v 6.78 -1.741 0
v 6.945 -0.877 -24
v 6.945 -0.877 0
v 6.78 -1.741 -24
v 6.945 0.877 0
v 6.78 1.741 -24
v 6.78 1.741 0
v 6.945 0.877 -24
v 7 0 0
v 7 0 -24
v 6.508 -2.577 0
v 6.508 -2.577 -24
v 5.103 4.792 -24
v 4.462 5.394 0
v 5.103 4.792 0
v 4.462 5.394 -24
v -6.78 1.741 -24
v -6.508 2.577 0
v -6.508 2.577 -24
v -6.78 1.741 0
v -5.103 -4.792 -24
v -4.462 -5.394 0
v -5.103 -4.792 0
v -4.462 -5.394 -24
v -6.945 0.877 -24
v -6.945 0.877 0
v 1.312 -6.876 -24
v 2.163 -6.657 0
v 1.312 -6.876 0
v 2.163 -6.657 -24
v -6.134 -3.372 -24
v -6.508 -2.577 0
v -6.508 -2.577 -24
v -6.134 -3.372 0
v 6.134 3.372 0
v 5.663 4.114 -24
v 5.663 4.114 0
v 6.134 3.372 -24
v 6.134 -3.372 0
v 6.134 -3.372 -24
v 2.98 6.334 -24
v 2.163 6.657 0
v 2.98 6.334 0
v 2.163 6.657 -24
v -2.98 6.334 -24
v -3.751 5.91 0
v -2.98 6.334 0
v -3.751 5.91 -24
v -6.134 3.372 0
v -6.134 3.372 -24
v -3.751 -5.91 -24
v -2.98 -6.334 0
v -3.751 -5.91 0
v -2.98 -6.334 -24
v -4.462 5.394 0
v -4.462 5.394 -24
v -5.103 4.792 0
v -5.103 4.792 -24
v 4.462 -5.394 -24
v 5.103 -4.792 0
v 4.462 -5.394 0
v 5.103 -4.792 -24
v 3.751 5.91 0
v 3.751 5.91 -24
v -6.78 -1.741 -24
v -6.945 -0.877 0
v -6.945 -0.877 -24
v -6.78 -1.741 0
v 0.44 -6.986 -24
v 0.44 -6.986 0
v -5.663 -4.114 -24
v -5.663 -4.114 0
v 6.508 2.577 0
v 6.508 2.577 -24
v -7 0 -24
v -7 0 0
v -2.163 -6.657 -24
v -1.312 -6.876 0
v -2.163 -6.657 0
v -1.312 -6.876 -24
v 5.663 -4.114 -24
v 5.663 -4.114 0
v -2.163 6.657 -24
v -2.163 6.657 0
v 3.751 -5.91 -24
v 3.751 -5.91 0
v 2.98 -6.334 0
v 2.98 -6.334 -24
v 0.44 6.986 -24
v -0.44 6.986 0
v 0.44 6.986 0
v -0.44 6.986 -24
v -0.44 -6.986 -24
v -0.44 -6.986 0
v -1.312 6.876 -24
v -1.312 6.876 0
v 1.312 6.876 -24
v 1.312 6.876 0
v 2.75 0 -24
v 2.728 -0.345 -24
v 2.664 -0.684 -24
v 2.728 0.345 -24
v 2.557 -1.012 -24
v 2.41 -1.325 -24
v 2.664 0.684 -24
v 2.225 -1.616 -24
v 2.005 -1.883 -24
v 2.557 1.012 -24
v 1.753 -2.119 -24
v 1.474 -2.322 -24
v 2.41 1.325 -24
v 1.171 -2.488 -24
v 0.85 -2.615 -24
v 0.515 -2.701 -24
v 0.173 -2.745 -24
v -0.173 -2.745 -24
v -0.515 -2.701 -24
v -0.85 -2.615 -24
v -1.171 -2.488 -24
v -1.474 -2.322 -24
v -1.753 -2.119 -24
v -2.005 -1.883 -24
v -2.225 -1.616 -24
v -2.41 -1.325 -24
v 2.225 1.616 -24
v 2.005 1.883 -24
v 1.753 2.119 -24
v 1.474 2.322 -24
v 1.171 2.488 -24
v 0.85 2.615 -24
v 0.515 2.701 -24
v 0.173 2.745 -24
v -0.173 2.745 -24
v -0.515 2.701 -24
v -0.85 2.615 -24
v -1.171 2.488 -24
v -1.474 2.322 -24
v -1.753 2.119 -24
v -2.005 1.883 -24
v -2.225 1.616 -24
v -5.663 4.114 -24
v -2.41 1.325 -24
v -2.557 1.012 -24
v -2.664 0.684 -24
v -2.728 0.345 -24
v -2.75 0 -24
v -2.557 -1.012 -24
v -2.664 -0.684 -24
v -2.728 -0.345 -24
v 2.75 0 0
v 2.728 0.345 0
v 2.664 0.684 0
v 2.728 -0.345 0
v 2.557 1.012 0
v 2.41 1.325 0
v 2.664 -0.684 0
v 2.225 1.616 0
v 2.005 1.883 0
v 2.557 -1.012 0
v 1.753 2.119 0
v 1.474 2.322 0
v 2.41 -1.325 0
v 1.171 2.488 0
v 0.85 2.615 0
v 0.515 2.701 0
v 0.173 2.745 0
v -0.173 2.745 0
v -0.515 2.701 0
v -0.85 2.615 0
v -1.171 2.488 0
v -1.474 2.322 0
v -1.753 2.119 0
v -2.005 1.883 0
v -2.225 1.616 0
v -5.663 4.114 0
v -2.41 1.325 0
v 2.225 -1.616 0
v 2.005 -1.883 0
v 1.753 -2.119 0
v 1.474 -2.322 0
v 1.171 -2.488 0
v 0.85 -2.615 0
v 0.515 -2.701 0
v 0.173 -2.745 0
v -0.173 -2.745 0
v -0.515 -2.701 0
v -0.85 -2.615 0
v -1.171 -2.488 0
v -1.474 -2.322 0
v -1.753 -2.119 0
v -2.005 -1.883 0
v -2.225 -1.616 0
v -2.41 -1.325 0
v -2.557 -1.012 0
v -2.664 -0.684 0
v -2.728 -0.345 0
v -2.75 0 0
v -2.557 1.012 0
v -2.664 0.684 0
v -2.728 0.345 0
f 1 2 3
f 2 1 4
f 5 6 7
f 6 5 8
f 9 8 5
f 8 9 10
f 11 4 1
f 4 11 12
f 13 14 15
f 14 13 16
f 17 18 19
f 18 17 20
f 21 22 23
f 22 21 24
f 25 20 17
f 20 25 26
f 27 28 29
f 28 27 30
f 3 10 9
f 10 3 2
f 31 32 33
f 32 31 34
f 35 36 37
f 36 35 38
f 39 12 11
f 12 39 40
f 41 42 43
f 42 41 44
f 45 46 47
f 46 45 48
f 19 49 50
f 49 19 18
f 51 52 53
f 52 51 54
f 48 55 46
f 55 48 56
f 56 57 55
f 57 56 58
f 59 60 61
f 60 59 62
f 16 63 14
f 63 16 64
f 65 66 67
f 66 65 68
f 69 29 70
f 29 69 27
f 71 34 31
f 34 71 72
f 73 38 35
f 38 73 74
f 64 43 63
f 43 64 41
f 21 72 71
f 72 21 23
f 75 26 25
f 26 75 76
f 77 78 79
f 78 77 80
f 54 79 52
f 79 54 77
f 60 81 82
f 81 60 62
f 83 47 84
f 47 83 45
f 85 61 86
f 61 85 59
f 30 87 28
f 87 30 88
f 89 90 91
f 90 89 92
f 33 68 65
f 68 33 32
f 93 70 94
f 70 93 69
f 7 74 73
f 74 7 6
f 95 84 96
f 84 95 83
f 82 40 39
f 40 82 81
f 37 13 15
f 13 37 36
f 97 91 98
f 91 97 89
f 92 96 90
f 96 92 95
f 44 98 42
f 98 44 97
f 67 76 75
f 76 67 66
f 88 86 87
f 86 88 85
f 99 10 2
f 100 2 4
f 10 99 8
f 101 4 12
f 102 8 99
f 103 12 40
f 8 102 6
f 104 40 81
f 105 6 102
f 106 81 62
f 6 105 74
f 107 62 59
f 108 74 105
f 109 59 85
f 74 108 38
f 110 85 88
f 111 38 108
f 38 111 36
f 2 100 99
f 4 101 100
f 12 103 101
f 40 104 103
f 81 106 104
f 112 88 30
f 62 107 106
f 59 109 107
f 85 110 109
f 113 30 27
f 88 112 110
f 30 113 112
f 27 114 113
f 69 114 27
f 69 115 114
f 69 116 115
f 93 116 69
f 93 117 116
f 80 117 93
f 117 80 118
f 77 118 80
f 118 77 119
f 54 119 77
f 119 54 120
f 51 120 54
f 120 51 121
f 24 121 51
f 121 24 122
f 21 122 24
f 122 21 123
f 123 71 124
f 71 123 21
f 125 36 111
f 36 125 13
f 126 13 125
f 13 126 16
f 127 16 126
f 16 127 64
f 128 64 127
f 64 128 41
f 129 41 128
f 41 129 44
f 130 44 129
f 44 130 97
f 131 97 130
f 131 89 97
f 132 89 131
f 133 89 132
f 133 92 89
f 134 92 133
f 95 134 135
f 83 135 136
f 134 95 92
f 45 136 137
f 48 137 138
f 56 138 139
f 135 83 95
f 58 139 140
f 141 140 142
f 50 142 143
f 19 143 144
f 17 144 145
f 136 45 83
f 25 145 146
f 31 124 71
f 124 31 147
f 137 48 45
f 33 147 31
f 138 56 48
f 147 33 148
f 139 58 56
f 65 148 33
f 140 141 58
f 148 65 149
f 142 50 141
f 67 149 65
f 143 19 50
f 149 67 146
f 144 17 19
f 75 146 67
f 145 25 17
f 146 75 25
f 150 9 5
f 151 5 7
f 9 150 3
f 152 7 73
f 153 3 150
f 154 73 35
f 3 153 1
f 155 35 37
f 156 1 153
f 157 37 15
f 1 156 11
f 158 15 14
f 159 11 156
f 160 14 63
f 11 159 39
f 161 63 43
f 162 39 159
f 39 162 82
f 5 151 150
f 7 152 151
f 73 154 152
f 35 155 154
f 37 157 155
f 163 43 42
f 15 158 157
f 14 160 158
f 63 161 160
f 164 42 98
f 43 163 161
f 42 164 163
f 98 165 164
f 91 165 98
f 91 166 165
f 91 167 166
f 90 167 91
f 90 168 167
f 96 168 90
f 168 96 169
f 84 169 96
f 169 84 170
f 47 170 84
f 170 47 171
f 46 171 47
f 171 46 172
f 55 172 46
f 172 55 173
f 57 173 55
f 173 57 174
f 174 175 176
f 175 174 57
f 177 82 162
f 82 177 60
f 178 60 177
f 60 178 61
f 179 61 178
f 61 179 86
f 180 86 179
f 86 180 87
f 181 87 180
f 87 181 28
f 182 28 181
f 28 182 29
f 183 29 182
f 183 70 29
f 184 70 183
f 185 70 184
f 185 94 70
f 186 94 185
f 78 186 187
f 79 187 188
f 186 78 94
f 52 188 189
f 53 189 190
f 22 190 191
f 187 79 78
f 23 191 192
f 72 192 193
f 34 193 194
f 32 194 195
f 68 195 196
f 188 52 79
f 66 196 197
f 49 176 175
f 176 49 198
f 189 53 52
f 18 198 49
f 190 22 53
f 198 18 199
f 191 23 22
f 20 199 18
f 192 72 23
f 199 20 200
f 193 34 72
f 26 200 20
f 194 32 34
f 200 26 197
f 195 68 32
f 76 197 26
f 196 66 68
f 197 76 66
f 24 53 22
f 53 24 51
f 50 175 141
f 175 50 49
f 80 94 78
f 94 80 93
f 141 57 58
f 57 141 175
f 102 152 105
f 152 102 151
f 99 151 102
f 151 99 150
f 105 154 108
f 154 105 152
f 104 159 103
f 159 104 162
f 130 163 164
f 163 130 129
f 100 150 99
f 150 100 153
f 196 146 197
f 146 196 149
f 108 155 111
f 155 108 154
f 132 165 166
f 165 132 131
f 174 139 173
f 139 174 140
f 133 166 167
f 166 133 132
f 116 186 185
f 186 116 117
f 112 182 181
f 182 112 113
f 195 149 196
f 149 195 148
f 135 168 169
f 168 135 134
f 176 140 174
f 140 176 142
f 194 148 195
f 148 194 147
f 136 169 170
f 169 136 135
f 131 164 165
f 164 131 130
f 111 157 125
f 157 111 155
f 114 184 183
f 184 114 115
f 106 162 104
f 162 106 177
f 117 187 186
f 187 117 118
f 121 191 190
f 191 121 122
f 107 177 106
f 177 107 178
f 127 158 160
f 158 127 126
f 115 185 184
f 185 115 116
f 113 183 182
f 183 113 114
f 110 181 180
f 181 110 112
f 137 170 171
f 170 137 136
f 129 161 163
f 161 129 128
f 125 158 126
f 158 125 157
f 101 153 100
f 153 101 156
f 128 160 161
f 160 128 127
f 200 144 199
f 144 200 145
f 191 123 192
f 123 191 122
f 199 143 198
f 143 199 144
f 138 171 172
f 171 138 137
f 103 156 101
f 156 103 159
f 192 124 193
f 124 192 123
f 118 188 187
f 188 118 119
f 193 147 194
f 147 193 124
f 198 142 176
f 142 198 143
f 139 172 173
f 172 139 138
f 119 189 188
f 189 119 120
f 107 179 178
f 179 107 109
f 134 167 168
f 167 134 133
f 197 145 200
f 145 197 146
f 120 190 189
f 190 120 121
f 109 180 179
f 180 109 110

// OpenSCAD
$fn = 50;


difference() {
	union() {
		translate(v = [0, 0, -24.0000000000]) {
			cylinder(h = 24, r = 7.0000000000);
		}
		cylinder(h = 0, r = 10.0000000000);
	}
	union() {
		#translate(v = [0, 0, -24]) {
			cylinder(h = 24, r = 2.7500000000);
		}
	}
}
